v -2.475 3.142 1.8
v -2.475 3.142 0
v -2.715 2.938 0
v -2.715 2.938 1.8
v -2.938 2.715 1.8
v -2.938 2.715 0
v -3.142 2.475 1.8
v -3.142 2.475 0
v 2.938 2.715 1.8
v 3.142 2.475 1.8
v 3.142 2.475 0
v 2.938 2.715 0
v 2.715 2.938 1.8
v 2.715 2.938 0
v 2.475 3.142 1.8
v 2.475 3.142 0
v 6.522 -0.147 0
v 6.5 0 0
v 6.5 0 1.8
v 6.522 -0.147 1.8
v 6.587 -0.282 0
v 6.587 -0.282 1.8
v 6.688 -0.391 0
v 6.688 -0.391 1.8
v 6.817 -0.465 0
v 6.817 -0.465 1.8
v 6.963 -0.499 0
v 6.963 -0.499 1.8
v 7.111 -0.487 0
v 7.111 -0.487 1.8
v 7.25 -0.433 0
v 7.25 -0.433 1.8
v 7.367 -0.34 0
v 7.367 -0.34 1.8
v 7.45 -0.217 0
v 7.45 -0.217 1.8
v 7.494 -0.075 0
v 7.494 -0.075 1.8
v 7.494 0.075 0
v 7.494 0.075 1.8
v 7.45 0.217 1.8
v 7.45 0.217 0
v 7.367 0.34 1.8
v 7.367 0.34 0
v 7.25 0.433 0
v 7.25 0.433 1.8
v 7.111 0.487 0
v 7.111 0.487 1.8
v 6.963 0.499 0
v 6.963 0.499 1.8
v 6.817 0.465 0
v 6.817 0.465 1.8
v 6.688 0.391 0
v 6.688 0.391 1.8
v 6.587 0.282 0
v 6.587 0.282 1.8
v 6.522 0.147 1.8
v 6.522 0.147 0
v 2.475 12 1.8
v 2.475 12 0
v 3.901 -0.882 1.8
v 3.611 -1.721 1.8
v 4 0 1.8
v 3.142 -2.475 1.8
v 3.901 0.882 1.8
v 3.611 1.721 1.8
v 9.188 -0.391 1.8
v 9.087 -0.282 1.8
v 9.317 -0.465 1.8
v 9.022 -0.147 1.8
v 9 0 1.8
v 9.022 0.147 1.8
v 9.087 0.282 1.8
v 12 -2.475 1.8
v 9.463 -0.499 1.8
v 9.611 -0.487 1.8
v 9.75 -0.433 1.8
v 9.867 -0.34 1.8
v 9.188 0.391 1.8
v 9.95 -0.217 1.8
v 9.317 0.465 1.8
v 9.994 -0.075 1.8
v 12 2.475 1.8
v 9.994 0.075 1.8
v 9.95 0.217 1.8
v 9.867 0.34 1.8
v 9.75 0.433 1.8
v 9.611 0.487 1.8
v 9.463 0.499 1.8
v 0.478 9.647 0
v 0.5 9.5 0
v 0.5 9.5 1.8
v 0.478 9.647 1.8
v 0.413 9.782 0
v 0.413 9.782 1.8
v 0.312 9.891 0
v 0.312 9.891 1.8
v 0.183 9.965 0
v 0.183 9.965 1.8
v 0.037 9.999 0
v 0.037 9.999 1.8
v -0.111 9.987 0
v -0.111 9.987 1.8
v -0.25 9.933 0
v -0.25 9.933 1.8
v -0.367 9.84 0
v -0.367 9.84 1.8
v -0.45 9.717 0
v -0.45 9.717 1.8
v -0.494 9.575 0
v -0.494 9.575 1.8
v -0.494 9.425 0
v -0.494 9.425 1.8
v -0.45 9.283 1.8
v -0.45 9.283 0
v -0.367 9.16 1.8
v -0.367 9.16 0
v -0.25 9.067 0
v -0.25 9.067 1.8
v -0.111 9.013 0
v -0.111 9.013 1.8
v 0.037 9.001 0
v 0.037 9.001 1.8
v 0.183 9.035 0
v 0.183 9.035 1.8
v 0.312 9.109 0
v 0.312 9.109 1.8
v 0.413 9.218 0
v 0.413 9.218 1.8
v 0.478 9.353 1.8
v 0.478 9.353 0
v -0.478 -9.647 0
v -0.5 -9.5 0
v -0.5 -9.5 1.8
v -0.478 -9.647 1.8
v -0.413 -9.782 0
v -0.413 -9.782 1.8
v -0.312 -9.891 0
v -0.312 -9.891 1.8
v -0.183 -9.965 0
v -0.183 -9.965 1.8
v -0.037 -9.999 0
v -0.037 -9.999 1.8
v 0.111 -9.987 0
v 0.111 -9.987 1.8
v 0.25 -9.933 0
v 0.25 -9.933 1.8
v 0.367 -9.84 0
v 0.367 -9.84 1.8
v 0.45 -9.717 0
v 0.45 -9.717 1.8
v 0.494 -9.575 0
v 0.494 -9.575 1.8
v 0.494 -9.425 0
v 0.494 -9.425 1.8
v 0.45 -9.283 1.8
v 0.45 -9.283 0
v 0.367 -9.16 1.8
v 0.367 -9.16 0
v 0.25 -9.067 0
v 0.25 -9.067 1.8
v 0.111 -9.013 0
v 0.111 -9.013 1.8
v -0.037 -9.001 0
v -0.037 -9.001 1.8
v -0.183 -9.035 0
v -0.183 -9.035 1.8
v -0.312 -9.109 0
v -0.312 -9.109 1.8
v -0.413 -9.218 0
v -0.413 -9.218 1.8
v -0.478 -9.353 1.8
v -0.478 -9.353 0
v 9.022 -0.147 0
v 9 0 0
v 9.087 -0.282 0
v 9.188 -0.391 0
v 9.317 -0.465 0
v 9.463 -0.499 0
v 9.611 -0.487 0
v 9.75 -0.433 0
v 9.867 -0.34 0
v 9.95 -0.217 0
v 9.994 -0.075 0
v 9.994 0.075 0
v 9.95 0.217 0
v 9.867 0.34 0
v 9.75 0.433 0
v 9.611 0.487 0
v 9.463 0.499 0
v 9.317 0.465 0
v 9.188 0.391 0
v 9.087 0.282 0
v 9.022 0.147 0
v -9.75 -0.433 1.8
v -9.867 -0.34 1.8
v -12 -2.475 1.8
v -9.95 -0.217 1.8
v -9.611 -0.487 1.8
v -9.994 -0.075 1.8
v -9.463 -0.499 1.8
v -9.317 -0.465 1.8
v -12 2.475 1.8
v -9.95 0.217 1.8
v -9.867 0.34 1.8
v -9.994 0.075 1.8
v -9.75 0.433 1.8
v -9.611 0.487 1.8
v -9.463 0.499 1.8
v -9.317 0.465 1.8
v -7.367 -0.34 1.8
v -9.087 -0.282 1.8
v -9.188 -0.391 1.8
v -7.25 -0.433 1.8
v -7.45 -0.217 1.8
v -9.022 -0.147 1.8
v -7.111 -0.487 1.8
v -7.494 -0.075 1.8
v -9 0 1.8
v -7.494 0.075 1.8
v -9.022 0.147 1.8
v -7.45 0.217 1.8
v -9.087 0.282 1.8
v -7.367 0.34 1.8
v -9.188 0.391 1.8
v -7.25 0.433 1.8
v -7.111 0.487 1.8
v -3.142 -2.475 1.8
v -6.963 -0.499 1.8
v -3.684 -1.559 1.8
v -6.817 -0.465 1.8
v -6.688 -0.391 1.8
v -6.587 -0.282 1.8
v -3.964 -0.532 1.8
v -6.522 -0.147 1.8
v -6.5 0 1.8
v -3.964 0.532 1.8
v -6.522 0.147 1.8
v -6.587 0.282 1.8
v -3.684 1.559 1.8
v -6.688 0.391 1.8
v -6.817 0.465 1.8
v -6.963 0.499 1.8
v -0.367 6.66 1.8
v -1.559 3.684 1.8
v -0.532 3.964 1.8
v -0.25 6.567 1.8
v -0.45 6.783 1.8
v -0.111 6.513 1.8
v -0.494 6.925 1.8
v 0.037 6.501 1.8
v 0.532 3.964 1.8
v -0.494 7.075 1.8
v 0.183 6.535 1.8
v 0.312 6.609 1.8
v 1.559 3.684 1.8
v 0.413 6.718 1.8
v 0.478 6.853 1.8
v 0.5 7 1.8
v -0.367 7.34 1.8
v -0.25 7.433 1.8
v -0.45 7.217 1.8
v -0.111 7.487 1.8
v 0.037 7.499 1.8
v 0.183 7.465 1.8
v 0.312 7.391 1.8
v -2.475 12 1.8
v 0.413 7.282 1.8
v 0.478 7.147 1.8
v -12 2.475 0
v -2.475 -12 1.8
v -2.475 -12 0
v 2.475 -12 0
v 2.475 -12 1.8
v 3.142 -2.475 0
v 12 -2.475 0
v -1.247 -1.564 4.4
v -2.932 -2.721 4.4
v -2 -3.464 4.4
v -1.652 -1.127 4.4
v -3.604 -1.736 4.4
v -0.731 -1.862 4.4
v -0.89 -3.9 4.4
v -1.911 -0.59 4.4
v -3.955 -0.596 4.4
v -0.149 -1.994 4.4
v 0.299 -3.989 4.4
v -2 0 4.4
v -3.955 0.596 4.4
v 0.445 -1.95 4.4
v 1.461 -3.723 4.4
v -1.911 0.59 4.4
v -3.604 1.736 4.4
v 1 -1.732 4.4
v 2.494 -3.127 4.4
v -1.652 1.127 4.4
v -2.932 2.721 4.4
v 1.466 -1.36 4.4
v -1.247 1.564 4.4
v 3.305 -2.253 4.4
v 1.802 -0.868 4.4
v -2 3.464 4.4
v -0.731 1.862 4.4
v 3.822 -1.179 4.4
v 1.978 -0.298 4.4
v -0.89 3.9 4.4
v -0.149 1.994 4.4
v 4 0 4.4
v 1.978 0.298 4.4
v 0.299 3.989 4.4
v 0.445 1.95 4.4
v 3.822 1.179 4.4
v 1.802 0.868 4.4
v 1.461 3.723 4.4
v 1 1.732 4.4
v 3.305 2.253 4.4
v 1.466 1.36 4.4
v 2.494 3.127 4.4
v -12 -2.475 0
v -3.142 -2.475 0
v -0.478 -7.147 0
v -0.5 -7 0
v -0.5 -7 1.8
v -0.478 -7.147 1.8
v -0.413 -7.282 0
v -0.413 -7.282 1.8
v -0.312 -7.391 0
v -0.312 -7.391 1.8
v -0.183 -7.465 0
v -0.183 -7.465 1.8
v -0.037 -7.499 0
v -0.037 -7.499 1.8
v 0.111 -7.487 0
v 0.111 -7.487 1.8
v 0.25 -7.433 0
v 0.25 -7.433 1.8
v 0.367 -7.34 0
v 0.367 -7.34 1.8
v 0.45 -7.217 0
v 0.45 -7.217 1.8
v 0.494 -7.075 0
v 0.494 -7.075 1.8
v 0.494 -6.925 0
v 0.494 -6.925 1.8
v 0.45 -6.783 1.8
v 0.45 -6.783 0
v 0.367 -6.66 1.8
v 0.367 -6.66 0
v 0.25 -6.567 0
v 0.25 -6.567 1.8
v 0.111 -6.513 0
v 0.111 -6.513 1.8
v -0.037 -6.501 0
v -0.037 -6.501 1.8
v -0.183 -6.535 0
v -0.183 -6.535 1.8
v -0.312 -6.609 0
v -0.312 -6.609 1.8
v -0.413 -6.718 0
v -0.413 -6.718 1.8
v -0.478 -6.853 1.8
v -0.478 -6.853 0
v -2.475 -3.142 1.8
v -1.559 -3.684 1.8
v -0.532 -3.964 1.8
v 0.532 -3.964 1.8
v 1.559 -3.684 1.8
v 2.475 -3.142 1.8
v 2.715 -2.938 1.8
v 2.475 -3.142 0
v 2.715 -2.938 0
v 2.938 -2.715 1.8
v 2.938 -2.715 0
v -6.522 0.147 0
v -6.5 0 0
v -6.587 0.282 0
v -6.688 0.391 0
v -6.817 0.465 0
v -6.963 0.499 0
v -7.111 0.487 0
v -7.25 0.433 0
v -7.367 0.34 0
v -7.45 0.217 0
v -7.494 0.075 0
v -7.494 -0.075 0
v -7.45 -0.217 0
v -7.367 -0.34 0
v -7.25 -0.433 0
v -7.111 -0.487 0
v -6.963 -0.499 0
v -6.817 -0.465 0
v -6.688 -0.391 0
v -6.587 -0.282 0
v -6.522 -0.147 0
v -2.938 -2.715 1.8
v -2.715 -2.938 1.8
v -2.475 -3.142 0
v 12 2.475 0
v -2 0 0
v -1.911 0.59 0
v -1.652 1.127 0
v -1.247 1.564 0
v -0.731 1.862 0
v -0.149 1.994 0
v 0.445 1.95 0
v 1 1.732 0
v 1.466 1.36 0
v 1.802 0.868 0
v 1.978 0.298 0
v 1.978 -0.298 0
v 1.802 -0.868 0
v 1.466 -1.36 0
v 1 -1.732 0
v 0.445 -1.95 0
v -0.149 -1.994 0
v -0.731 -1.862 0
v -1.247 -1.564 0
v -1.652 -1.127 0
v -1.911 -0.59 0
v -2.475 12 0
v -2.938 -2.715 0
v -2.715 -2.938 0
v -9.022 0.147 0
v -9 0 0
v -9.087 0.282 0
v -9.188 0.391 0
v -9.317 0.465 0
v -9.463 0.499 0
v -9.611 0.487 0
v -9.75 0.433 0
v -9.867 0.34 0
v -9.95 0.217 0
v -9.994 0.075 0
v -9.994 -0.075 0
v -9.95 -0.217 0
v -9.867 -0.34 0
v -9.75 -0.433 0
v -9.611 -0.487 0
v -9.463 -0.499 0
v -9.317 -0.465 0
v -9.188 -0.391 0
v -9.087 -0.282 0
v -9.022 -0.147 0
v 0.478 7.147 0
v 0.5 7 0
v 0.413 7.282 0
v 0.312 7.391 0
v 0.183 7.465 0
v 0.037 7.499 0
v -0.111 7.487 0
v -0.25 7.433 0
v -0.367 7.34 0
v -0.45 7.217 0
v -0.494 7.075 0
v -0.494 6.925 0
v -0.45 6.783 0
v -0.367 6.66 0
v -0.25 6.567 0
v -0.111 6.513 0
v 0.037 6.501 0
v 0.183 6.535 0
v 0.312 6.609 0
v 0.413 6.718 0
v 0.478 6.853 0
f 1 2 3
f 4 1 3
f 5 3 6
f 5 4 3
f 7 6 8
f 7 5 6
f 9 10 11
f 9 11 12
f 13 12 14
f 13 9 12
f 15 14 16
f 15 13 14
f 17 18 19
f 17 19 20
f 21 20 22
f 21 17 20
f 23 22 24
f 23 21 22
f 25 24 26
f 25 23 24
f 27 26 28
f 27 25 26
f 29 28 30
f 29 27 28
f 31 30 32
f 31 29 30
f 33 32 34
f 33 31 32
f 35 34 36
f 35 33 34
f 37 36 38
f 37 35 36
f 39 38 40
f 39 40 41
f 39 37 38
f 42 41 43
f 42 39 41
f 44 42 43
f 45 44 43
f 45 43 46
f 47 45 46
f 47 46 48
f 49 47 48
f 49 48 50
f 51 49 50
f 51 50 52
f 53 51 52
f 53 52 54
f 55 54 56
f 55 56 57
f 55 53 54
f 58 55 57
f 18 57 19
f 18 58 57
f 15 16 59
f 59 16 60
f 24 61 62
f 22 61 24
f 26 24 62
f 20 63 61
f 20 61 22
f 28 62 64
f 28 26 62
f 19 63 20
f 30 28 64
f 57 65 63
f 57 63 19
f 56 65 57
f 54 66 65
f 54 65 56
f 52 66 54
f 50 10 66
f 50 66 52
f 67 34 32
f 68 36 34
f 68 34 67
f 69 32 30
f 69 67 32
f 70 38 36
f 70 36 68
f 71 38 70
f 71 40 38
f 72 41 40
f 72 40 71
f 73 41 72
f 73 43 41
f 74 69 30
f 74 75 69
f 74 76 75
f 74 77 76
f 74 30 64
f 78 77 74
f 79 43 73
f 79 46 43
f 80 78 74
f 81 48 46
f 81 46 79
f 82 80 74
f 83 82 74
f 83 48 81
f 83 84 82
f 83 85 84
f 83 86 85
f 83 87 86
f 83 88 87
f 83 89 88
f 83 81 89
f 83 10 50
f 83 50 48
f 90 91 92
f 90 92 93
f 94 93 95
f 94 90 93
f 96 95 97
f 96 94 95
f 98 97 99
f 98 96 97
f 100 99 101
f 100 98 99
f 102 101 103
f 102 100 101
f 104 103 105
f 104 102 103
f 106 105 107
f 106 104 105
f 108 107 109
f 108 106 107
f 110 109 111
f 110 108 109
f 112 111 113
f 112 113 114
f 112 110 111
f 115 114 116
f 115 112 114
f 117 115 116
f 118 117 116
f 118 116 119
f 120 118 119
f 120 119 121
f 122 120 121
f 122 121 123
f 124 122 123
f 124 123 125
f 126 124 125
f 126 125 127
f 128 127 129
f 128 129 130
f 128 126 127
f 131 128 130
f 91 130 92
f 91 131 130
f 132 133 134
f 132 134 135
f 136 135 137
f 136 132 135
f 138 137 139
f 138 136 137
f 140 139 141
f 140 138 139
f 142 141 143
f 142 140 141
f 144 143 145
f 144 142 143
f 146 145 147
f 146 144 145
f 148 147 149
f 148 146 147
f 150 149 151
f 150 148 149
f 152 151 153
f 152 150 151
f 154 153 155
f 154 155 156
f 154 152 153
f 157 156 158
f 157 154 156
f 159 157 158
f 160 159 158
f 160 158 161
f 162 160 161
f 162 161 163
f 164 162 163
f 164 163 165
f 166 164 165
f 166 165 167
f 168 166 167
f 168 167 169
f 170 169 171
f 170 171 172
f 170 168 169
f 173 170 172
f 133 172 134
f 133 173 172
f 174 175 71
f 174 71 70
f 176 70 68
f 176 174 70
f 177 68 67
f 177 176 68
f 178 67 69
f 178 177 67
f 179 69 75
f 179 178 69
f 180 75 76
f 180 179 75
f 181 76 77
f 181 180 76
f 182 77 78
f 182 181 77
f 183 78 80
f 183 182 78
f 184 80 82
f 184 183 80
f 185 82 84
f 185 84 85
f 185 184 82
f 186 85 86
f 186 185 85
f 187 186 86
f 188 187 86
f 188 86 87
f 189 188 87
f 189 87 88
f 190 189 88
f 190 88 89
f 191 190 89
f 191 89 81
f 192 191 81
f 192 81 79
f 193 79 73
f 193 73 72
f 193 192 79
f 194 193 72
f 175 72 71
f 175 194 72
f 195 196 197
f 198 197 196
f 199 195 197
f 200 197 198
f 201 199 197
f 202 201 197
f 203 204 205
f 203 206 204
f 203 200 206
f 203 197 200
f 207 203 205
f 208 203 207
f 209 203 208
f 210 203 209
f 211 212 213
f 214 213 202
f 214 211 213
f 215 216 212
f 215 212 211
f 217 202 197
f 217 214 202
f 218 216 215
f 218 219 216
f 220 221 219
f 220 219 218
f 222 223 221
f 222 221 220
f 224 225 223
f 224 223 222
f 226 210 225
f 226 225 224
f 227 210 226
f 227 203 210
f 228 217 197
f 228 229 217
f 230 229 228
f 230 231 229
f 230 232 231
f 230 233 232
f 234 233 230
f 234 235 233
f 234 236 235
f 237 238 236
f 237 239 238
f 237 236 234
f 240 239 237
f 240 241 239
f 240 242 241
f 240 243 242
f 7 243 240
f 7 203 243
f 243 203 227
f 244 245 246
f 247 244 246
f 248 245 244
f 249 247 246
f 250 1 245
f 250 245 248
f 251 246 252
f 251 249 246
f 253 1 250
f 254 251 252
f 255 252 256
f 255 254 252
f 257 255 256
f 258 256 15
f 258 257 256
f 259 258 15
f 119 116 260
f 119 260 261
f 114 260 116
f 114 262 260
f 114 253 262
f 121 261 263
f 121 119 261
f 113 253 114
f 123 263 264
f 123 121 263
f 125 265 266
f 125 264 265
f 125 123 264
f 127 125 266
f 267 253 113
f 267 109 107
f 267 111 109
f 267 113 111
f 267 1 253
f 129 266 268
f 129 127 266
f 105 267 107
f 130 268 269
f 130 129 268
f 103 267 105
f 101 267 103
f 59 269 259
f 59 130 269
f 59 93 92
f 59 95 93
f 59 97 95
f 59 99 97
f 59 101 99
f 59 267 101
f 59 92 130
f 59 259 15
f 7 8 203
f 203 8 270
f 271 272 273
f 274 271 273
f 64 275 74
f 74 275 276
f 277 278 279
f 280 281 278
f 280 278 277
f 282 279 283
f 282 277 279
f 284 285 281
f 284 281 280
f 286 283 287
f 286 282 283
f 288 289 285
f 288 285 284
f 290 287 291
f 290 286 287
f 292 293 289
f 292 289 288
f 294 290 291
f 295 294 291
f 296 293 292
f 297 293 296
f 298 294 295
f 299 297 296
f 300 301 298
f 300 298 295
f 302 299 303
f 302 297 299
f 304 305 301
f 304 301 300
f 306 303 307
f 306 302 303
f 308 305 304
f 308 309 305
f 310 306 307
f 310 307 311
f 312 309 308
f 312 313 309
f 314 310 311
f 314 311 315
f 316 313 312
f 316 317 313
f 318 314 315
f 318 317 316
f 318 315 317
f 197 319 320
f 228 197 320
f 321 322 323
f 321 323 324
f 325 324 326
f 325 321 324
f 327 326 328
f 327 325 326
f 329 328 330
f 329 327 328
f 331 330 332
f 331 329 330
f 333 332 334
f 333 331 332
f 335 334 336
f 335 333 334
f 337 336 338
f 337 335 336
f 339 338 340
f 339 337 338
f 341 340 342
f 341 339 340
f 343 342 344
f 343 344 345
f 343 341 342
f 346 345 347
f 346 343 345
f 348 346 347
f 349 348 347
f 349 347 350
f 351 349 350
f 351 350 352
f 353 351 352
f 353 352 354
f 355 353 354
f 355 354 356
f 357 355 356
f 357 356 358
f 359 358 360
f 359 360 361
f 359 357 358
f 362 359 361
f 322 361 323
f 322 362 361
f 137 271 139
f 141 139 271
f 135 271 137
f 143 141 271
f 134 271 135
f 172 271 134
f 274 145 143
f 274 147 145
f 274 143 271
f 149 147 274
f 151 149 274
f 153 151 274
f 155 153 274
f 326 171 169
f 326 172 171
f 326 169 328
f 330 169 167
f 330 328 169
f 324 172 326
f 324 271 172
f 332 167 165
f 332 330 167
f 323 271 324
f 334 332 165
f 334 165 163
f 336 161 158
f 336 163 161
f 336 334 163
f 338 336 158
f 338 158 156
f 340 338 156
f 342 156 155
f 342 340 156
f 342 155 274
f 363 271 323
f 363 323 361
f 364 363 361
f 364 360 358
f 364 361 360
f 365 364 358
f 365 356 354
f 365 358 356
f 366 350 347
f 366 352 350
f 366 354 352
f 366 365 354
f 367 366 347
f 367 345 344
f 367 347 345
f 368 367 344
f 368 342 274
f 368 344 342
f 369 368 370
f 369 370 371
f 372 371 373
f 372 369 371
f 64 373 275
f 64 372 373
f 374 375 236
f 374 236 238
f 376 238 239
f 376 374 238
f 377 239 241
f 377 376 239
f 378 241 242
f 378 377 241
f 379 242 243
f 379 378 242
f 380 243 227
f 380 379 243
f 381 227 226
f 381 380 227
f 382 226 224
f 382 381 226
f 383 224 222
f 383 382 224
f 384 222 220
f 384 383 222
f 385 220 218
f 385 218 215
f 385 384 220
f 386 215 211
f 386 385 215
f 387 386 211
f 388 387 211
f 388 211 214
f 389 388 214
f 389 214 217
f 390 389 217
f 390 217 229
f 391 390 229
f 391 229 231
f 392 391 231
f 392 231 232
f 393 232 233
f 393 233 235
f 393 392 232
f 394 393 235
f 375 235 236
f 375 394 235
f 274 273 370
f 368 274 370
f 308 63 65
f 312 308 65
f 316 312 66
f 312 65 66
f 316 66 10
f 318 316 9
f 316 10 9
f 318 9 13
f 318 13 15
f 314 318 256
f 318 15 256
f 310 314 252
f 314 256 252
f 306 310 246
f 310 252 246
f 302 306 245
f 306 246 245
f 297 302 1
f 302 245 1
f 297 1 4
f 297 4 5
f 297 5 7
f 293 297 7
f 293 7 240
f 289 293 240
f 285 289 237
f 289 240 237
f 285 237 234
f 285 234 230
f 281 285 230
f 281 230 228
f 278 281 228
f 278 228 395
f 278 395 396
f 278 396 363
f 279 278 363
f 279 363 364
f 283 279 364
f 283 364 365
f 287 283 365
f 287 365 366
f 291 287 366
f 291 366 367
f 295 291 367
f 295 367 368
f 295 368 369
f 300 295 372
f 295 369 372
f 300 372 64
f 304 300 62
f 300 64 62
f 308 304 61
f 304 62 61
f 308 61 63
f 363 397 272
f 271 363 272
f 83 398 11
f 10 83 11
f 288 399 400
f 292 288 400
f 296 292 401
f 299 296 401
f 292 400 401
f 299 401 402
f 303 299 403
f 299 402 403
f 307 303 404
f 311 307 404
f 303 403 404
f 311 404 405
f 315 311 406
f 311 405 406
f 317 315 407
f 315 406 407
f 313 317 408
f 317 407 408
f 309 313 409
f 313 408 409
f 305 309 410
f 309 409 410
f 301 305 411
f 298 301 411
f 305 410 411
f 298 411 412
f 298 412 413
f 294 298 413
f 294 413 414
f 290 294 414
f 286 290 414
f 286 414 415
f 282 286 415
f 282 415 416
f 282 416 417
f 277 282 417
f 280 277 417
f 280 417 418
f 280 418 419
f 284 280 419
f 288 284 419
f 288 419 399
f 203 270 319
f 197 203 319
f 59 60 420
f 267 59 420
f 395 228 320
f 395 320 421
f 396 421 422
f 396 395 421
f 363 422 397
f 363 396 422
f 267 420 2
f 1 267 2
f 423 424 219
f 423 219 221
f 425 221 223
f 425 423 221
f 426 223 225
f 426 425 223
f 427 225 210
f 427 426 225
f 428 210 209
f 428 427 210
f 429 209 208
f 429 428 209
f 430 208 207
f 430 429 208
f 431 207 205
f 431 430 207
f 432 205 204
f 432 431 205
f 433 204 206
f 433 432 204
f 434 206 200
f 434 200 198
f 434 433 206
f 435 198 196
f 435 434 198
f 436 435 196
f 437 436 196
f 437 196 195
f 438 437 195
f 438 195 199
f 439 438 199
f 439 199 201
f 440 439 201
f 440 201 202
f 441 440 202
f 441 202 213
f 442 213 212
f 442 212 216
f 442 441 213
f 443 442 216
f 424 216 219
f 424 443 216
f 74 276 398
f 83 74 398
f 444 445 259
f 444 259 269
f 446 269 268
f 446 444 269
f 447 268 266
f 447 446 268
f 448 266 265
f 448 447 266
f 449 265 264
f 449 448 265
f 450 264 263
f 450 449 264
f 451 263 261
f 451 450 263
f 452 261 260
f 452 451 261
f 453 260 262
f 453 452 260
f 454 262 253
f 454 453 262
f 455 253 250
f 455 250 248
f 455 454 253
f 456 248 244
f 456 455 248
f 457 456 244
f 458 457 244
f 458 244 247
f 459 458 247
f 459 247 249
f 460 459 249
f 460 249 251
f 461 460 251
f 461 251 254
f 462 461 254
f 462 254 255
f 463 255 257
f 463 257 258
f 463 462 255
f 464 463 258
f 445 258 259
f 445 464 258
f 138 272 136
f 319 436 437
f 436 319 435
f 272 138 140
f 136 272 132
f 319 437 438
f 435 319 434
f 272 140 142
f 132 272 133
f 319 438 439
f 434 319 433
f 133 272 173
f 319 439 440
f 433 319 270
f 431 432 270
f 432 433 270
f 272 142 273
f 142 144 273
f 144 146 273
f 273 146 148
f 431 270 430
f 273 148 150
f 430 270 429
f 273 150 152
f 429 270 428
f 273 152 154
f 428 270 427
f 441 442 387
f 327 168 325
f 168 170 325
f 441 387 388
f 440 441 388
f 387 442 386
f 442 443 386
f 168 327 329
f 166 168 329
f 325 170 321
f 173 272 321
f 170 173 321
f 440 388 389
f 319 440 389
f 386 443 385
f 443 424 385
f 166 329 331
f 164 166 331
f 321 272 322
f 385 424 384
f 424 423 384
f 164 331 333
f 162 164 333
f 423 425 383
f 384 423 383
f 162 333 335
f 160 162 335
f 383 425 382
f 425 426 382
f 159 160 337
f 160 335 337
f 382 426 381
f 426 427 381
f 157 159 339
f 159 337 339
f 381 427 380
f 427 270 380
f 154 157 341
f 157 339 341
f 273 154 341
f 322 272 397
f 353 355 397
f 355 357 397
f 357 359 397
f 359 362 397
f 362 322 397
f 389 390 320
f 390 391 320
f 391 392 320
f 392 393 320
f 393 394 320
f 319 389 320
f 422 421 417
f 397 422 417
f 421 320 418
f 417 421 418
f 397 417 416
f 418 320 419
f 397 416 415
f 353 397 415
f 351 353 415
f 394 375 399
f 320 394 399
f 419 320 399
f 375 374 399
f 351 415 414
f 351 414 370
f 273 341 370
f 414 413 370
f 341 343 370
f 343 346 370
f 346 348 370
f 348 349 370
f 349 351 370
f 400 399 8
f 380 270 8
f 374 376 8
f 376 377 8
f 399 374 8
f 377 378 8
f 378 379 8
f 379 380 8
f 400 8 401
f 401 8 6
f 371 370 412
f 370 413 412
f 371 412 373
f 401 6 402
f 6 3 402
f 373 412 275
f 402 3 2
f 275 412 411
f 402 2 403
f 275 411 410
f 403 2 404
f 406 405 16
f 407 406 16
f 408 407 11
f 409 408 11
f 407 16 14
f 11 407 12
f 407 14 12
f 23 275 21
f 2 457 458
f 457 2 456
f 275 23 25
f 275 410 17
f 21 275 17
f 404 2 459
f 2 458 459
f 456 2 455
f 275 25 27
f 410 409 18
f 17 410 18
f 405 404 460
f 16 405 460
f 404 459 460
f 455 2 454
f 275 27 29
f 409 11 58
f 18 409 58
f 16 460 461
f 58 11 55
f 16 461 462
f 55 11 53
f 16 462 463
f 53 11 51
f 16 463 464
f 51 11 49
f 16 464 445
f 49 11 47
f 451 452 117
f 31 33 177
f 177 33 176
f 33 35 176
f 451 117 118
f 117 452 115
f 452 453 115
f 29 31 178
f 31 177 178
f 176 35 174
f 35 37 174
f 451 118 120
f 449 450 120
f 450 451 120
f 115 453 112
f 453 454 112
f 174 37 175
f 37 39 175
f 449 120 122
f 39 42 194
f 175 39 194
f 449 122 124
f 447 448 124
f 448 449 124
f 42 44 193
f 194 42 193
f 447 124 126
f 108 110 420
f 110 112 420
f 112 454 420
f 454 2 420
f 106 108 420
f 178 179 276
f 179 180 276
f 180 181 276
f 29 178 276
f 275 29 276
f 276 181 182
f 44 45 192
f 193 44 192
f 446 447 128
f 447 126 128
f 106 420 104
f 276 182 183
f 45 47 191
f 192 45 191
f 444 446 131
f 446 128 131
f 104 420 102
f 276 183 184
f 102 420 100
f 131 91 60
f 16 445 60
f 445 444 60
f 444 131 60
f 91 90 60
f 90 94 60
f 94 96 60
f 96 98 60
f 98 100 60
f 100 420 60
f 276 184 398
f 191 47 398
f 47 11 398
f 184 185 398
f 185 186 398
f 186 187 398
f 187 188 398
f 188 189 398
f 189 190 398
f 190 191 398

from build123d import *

# Parameters (mm, degrees)
SKETCH1_R                       = 0.5
BOSS_EXTRUDE1_DEPTH             = 1.8
SKETCH2_R                       = 4
BOSS_EXTRUDE2_DEPTH             = 2.6
BOSS_EXTRUDE2_DIRECTION_2_REACH = 19.066
SKETCH3_R                       = 2
CUT_EXTRUDE1_DEPTH              = 18.531685601


with BuildPart() as part:
    # Sketch1 → Boss-Extrude1 (new body)
    with BuildSketch(Plane.XY):
        Polygon((-2.475, -12), (2.475, -12), (2.475, -2.475), (12, -2.475), (12, 2.475), (2.475, 2.475), (2.475, 12), (-2.475, 12), (-2.475, 2.475), (-12, 2.475), (-12, -2.475), (-2.475, -2.475), align=None)
        with Locations((0, 9.5)):
            Circle(SKETCH1_R, mode=Mode.SUBTRACT)
        with Locations((0, 7)):
            Circle(SKETCH1_R, mode=Mode.SUBTRACT)
        with Locations(Location((0, -9.5, 0), (0, 0, 180))):
            Circle(SKETCH1_R, mode=Mode.SUBTRACT)
        with Locations(Location((0, -7, 0), (0, 0, 180))):
            Circle(SKETCH1_R, mode=Mode.SUBTRACT)
        with Locations((-9.5, 0)):
            Circle(SKETCH1_R, mode=Mode.SUBTRACT)
        with Locations((-7, 0)):
            Circle(SKETCH1_R, mode=Mode.SUBTRACT)
        with Locations(Location((9.5, 0, 0), (0, 0, 180))):
            Circle(SKETCH1_R, mode=Mode.SUBTRACT)
        with Locations(Location((7, 0, 0), (0, 0, 180))):
            Circle(SKETCH1_R, mode=Mode.SUBTRACT)
    extrude(amount=BOSS_EXTRUDE1_DEPTH)

    # Sketch2 → Boss-Extrude2 (add)
    with BuildSketch(Plane.XY.offset(1.8)):
        Circle(SKETCH2_R)
    extrude(amount=BOSS_EXTRUDE2_DEPTH)

    # Boss-Extrude2 direction 2: up to this face of the body (flat: up to its plane)
    boss_extrude2_direction_2_end = Plane(part.part.faces().sort_by_distance((0, 0, 0))[0])
    # Sketch2 → Boss-Extrude2 direction 2 (add, up to the picked face)
    with BuildSketch(Plane.XY.offset(1.8), mode=Mode.PRIVATE) as boss_extrude2_direction_2_sk1:
        Circle(SKETCH2_R)
    boss_extrude2_direction_2_tool1 = split(extrude(boss_extrude2_direction_2_sk1.sketch, amount=-BOSS_EXTRUDE2_DIRECTION_2_REACH, mode=Mode.PRIVATE), bisect_by=boss_extrude2_direction_2_end, keep=Keep.BOTH, mode=Mode.PRIVATE)
    add(boss_extrude2_direction_2_tool1.solids().sort_by(Axis((0, 0, 1.8), (0, 0, -1)))[0])

    # Sketch3 → Cut-Extrude1 (cut, through all)
    with BuildSketch(Plane(origin=(0, 0, 0), x_dir=(-1, 0, 0), z_dir=(0, 0, -1))):
        Circle(SKETCH3_R)
    extrude(amount=-CUT_EXTRUDE1_DEPTH, mode=Mode.SUBTRACT)


solid = part.part
